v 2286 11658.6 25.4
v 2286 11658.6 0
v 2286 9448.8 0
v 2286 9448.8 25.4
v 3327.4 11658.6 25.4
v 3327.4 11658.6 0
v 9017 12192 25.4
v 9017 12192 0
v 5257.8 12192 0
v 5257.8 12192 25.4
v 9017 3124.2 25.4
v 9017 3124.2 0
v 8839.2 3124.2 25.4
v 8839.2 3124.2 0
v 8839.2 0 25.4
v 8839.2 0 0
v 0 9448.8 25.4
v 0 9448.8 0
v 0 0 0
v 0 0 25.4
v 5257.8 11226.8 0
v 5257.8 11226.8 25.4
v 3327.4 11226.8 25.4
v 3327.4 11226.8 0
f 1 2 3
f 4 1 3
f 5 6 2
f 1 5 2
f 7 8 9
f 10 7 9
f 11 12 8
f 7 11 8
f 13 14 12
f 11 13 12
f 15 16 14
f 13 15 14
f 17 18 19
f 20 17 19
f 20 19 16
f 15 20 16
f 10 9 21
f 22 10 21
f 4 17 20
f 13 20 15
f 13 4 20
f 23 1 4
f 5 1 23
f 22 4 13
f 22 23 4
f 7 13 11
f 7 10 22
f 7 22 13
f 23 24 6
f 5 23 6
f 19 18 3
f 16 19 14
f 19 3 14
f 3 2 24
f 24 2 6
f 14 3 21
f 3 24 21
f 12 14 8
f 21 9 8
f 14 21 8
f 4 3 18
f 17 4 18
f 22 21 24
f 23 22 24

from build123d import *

# Parameters (mm, degrees)
F0_W     = 889
F0_H     = 1651
F0_H_2   = 914.4
F1_DEPTH = 25.4


with BuildPart() as f1:
    # F0 (on Top) → F1 (new body)
    with BuildSketch(Plane.XY):
        Polygon((0, 6604), (0, 0), (4749.8, 0), (8839.2, 0), (8839.2, 3124.2), (7289.8, 3124.2), (7289.8, 4013.2), (9017, 4013.2), (9017, 5638.8), (8356.6, 5638.8), (8356.6, 7747), (6451.6, 7747), (6451.6, 8407.4), (6451.6, 9321.8), (6451.6, 10972.8), (7340.6, 10972.8), (7340.6, 9321.8), (7340.6, 8407.4), (9017, 8407.4), (9017, 10972.8), (9017, 12192), (8077.2, 12192), (5257.8, 12192), (5257.8, 11226.8), (3327.4, 11226.8), (3327.4, 11658.6), (2286, 11658.6), (2286, 9448.8), (0, 9448.8), align=None)
        Polygon((5257.8, 8432.8), (4038.6, 8432.8), (4038.6, 8305.8), (3784.6, 8305.8), (3784.6, 9448.8), (5257.8, 9448.8), align=None, mode=Mode.SUBTRACT)
        Polygon((4038.6, 8305.8), (4038.6, 8432.8), (5257.8, 8432.8), (5257.8, 9448.8), (3784.6, 9448.8), (3784.6, 8305.8), align=None)
        with Locations((6896.1, 10147.3)):
            Rectangle(F0_W, F0_H)
        with Locations((6896.1, 8864.6)):
            Rectangle(F0_W, F0_H_2)
        Polygon((8356.6, 5638.8), (9017, 5638.8), (9017, 8407.4), (7340.6, 8407.4), (6451.6, 8407.4), (6451.6, 7747), (8356.6, 7747), align=None)
        Polygon((7289.8, 3124.2), (8839.2, 3124.2), (9017, 3124.2), (9017, 4013.2), (7289.8, 4013.2), align=None)
    extrude(amount=F1_DEPTH)


solid = f1.part
